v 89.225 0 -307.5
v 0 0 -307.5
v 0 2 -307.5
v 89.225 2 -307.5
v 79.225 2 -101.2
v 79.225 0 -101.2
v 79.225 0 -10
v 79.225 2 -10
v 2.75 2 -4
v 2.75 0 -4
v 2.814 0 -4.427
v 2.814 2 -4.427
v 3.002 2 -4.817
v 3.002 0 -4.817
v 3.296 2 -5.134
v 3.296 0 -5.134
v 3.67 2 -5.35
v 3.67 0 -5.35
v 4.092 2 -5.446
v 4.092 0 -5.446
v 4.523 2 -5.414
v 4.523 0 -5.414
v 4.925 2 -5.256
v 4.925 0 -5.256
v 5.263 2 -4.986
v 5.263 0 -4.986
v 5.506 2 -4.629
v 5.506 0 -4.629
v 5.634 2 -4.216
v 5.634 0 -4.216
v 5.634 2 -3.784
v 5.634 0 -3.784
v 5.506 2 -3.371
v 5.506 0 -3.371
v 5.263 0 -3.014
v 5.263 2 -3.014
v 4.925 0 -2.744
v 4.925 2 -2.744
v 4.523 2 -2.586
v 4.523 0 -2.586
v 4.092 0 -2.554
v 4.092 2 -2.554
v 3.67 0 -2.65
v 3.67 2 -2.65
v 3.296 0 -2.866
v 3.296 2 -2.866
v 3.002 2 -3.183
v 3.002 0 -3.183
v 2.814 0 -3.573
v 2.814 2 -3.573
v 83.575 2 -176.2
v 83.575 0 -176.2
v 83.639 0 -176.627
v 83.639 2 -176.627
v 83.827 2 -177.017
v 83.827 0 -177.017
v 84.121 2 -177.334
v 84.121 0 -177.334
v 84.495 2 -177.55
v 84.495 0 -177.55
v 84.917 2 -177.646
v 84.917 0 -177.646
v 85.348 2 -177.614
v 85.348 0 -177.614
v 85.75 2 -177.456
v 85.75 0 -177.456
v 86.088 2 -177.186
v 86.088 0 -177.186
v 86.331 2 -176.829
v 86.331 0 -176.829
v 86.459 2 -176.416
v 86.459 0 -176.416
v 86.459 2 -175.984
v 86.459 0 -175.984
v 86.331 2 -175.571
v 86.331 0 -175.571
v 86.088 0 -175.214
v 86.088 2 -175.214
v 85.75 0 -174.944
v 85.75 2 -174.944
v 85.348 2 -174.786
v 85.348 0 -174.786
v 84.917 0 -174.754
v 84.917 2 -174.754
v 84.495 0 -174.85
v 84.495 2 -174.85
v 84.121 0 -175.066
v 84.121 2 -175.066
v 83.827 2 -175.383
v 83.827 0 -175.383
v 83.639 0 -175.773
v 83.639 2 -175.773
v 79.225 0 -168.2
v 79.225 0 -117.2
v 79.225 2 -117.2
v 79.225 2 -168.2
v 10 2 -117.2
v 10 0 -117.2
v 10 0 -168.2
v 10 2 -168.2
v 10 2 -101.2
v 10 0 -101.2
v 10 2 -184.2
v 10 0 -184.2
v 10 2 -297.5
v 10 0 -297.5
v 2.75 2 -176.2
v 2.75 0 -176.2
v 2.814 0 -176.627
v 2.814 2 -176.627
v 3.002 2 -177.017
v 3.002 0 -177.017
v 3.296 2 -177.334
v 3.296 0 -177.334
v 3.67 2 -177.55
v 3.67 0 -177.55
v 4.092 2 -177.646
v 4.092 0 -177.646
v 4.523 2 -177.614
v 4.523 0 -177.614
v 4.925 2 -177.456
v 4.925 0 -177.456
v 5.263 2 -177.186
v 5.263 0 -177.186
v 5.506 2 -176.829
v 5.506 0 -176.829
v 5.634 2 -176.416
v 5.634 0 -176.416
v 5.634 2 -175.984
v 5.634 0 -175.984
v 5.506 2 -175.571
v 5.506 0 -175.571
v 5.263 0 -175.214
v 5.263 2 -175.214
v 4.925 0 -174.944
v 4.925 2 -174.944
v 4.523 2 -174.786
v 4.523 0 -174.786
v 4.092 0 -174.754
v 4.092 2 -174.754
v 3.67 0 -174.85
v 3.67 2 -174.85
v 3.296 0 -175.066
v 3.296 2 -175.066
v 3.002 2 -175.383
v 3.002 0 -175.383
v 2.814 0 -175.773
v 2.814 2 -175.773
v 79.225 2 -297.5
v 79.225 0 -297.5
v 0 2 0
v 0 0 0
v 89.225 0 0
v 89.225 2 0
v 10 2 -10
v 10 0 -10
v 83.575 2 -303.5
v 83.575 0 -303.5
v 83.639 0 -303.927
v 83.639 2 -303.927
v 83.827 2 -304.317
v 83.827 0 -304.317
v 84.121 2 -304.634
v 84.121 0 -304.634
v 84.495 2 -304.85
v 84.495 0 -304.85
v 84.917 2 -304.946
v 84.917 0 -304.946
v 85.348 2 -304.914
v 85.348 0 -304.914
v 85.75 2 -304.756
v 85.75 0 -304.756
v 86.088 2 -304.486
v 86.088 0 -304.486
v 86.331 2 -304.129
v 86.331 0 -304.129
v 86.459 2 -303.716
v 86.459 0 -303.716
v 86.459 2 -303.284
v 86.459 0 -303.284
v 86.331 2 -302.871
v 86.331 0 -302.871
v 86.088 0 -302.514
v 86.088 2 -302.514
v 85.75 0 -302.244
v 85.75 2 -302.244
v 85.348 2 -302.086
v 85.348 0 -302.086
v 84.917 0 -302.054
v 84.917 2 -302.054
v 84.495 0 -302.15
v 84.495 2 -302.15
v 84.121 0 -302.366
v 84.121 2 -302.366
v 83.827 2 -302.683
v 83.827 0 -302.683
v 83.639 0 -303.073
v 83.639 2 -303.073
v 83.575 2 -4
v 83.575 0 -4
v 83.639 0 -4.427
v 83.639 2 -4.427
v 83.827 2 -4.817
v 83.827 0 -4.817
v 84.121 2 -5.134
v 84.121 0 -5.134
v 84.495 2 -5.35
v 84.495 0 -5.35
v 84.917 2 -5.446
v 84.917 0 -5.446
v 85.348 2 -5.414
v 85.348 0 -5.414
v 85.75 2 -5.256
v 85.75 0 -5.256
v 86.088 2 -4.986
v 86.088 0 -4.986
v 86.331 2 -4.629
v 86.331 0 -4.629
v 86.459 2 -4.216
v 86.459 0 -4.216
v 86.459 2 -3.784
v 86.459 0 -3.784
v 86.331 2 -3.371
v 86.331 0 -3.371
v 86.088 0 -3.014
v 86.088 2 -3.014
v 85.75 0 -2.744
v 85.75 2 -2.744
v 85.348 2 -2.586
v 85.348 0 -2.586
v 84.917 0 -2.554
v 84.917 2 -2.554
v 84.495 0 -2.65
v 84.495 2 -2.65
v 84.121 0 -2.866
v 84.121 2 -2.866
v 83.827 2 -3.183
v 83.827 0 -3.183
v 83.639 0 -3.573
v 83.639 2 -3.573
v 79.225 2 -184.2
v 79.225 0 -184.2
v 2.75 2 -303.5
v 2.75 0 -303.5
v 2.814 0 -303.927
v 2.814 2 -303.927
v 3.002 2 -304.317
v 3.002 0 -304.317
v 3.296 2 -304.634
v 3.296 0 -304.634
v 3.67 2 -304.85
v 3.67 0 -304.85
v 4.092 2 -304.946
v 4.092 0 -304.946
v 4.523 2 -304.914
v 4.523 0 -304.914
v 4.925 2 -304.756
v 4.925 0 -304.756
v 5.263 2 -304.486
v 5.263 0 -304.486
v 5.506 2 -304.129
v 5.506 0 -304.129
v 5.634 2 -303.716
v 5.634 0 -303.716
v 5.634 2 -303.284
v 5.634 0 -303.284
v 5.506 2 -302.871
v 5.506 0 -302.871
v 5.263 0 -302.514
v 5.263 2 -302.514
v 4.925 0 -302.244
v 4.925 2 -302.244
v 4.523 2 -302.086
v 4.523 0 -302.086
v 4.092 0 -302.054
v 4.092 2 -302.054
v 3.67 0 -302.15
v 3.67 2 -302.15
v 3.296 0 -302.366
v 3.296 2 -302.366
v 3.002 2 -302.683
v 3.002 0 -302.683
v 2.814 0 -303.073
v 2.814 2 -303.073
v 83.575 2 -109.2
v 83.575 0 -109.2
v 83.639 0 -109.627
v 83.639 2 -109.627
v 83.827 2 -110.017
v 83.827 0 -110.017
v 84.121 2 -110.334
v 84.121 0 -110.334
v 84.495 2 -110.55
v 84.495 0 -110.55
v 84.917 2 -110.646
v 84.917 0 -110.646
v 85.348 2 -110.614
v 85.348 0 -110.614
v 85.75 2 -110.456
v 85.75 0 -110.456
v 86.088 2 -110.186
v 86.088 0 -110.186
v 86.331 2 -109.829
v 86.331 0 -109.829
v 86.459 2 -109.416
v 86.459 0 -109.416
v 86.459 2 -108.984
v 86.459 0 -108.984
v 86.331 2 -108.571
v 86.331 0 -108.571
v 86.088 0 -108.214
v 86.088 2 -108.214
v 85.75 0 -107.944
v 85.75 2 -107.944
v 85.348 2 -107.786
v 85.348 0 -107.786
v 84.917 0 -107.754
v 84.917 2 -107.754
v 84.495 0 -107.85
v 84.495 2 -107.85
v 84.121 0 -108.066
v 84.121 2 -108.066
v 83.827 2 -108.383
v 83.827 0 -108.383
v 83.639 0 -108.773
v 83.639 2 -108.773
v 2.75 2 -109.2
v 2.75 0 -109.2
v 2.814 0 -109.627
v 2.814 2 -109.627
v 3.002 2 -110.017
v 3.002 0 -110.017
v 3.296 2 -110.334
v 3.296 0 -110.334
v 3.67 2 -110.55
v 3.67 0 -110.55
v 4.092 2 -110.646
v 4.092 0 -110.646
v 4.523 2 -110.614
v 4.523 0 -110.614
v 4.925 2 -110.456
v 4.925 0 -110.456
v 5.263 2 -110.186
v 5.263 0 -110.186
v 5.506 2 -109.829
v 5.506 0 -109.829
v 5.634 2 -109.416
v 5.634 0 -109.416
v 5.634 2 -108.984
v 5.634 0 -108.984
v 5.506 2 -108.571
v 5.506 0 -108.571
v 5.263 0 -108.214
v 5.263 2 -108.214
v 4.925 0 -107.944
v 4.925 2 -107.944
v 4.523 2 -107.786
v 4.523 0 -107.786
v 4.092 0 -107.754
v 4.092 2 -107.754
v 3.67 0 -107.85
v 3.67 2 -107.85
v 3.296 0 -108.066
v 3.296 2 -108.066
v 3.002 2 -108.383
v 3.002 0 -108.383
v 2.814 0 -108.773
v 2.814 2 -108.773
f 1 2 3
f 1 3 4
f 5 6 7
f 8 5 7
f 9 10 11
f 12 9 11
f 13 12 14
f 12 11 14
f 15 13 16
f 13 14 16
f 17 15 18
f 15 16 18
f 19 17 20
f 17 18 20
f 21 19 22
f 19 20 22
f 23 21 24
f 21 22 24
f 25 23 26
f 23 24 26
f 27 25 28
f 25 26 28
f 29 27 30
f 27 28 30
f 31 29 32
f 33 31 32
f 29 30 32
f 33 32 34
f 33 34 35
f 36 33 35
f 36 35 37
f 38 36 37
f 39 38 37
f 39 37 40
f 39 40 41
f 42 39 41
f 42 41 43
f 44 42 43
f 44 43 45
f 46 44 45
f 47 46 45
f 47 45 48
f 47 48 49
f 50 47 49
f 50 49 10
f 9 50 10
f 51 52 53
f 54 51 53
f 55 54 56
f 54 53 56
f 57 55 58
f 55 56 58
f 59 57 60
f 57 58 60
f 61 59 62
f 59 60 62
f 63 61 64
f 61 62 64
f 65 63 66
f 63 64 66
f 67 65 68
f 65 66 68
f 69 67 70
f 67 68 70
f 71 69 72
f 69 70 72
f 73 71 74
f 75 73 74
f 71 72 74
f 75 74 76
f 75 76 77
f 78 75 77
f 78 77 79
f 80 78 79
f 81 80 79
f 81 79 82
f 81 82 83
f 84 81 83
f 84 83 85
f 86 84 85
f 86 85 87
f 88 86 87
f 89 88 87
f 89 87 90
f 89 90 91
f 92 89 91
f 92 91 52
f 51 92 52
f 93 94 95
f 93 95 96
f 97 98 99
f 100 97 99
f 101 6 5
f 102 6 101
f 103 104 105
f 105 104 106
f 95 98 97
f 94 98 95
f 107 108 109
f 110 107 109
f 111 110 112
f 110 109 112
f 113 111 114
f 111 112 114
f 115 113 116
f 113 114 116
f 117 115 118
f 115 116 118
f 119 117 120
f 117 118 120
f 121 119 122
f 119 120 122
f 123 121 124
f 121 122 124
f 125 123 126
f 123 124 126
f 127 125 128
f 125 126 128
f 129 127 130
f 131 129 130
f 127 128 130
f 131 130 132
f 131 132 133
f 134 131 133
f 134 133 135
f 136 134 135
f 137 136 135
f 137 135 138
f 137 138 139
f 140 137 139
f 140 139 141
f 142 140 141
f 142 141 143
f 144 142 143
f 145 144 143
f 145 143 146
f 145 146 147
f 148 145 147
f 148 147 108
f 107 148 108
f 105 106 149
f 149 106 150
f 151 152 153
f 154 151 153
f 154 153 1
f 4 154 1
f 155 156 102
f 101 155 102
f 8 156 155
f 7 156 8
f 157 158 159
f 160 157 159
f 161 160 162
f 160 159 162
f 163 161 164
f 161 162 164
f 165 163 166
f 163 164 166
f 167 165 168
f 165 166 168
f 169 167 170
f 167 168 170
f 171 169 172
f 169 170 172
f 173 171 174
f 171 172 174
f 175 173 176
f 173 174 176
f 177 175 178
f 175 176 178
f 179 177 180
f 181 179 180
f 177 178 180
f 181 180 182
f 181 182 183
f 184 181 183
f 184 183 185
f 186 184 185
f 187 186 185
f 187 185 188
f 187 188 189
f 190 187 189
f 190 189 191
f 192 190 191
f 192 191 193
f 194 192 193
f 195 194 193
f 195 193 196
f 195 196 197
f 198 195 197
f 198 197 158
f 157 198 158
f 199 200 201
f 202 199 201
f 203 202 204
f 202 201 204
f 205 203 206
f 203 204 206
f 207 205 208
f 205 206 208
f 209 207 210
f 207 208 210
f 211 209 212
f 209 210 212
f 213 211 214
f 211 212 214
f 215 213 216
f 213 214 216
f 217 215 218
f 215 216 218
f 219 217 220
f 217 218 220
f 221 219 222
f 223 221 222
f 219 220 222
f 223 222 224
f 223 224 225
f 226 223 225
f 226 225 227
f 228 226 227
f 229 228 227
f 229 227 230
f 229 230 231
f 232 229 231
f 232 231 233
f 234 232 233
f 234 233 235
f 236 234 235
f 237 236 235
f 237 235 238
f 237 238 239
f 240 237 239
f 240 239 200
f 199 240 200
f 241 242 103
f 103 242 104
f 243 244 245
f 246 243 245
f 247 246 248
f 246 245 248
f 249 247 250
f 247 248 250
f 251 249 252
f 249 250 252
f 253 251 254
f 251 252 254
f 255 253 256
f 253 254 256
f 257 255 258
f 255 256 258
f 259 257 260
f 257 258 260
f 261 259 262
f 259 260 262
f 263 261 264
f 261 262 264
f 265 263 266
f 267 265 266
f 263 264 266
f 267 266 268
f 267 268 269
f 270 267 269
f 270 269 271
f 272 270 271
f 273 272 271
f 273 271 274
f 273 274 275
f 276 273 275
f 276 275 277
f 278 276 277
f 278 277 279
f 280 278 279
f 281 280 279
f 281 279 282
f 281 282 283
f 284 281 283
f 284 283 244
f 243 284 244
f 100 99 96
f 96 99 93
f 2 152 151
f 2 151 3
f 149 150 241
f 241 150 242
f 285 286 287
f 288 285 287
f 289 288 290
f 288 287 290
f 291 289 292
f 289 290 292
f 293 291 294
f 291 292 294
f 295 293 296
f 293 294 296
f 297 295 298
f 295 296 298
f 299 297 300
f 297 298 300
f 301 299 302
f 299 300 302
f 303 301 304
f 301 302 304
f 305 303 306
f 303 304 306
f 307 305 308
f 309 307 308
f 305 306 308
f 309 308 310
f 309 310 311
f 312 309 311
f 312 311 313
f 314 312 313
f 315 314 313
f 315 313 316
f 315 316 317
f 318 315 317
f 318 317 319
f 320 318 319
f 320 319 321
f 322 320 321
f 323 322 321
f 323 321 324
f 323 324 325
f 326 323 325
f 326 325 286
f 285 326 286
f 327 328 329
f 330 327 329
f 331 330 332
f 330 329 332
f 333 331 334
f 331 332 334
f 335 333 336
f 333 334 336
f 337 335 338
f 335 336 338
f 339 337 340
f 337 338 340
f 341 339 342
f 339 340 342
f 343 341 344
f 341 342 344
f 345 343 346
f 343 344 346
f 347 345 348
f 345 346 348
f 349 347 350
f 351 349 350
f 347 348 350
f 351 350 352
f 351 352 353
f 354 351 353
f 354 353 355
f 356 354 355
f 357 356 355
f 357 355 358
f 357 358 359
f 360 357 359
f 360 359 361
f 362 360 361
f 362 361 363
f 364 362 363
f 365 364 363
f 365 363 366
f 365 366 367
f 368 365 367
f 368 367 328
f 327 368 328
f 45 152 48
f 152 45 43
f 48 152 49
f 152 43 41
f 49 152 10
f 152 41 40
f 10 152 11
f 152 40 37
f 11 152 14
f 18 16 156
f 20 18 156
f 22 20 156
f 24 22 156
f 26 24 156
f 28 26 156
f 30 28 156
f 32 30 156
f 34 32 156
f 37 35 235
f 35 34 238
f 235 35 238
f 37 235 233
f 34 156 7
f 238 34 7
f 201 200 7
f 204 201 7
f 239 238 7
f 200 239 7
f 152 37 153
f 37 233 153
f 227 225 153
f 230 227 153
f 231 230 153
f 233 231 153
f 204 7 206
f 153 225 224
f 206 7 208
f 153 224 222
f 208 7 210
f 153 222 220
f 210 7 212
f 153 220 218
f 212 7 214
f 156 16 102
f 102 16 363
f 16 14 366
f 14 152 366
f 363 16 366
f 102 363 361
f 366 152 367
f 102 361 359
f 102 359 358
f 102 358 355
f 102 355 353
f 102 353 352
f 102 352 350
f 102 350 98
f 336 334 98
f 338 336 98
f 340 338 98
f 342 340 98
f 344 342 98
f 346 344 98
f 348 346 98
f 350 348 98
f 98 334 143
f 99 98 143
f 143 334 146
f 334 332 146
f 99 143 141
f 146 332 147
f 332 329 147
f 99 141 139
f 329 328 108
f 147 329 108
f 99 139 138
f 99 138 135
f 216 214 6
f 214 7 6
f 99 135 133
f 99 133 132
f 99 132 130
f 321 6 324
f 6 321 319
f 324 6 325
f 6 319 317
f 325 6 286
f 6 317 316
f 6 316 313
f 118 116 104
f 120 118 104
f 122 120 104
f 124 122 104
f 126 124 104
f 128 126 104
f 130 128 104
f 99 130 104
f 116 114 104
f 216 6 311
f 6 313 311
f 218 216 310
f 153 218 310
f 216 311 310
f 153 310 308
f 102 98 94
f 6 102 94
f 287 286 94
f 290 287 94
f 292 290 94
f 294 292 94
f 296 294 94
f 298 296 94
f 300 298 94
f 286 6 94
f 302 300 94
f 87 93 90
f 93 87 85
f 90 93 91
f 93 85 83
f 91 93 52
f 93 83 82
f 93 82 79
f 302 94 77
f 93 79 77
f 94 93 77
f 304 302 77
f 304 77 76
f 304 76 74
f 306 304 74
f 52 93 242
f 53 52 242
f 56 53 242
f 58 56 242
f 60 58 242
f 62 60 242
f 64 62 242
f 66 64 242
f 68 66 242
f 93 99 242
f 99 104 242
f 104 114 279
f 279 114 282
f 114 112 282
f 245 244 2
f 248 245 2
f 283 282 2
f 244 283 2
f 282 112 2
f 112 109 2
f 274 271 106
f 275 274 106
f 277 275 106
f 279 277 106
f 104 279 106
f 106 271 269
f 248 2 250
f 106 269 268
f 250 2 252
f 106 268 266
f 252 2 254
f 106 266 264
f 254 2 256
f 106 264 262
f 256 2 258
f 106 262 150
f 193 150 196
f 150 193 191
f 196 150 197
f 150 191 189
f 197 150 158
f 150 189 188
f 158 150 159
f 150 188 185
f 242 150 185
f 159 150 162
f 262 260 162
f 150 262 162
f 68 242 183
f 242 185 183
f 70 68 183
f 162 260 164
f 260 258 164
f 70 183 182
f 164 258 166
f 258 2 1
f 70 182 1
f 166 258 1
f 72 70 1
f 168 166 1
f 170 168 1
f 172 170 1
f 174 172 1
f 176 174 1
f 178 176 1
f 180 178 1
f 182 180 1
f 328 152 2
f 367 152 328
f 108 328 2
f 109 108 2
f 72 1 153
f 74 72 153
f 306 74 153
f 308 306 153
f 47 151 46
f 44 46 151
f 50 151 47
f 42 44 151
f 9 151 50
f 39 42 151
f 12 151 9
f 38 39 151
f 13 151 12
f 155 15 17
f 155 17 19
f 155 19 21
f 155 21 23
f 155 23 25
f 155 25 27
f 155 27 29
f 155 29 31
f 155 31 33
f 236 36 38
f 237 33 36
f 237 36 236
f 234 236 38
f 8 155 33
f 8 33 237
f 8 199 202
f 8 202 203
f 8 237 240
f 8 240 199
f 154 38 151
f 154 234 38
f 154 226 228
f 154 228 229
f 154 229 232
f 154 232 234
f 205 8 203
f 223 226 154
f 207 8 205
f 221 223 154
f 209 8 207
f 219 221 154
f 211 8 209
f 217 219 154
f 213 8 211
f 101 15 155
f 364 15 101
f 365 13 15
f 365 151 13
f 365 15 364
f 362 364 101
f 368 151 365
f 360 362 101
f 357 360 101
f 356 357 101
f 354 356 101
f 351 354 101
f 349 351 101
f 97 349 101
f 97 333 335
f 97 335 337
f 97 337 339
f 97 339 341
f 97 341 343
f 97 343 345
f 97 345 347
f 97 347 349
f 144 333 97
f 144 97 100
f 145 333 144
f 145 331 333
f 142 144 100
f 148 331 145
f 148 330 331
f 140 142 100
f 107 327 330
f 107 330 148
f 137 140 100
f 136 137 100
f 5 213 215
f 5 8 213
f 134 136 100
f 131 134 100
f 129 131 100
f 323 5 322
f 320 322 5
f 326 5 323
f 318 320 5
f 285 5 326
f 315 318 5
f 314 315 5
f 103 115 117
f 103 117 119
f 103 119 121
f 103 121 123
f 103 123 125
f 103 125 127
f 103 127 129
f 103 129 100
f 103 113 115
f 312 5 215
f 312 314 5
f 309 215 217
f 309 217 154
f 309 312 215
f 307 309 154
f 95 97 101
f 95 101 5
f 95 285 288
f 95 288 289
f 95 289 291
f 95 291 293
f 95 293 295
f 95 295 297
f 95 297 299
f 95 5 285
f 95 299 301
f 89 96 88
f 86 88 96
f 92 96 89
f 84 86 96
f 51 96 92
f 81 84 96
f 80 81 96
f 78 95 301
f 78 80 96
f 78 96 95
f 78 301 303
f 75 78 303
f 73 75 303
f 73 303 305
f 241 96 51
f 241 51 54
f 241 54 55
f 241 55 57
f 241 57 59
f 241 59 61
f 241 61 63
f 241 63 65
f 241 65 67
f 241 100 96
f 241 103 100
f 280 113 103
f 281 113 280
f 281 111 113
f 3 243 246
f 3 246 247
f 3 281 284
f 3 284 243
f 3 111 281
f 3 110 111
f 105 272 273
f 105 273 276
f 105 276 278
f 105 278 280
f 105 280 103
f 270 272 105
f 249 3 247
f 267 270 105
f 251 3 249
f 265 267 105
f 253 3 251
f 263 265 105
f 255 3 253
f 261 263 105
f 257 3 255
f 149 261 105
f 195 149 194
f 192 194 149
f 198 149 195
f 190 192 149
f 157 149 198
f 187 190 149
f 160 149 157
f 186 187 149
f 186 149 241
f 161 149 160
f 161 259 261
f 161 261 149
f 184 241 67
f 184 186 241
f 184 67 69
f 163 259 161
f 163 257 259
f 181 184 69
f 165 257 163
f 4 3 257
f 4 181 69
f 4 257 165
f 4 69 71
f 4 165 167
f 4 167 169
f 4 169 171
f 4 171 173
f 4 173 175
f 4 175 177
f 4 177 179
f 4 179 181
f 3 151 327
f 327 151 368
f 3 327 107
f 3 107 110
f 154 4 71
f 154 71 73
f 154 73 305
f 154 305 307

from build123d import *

# Parameters (mm, degrees)
SKETCH1_W              = 89.225
SKETCH1_H              = 307.5
SKETCH1_W_2            = 69.225
SKETCH1_H_2            = 51
BOSS_EXTRUDE1_DEPTH    = 2
M2_5_CLEARANCE_HOLE6_D = 2.9


with BuildPart() as part:
    # Sketch1 → Boss-Extrude1 (new body)
    with BuildSketch(Plane(origin=(0, 0, 0), x_dir=(1, 0, 0), z_dir=(0, 1, 0))):
        with Locations((44.6125, 153.75)):
            Rectangle(SKETCH1_W, SKETCH1_H)
        Polygon((10, 10), (79.225, 10), (79.225, 21.8), (79.225, 81.2), (79.225, 101.2), (10, 101.2), (10, 81.2), (10, 21.8), align=None, mode=Mode.SUBTRACT)
        with Locations((44.6125, 142.7)):
            Rectangle(SKETCH1_W_2, SKETCH1_H_2, mode=Mode.SUBTRACT)
        Polygon((10, 297.5), (79.225, 297.5), (79.225, 283.2), (79.225, 209.2), (79.225, 184.2), (10, 184.2), (10, 209.2), (10, 283.2), align=None, mode=Mode.SUBTRACT)
    extrude(amount=BOSS_EXTRUDE1_DEPTH)

    # M2.5 Clearance Hole6 (through all)
    with Locations(Plane(origin=(0, 2, 0), x_dir=(1, 0, 0), z_dir=(0, 1, 0))):
        with Locations((85.025, 4), (4.2, 4), (4.2, 109.2), (4.2, 176.2), (4.2, 303.5), (85.025, 303.5), (85.025, 176.2), (85.025, 109.2)):
            Hole(M2_5_CLEARANCE_HOLE6_D / 2)


solid = part.part
